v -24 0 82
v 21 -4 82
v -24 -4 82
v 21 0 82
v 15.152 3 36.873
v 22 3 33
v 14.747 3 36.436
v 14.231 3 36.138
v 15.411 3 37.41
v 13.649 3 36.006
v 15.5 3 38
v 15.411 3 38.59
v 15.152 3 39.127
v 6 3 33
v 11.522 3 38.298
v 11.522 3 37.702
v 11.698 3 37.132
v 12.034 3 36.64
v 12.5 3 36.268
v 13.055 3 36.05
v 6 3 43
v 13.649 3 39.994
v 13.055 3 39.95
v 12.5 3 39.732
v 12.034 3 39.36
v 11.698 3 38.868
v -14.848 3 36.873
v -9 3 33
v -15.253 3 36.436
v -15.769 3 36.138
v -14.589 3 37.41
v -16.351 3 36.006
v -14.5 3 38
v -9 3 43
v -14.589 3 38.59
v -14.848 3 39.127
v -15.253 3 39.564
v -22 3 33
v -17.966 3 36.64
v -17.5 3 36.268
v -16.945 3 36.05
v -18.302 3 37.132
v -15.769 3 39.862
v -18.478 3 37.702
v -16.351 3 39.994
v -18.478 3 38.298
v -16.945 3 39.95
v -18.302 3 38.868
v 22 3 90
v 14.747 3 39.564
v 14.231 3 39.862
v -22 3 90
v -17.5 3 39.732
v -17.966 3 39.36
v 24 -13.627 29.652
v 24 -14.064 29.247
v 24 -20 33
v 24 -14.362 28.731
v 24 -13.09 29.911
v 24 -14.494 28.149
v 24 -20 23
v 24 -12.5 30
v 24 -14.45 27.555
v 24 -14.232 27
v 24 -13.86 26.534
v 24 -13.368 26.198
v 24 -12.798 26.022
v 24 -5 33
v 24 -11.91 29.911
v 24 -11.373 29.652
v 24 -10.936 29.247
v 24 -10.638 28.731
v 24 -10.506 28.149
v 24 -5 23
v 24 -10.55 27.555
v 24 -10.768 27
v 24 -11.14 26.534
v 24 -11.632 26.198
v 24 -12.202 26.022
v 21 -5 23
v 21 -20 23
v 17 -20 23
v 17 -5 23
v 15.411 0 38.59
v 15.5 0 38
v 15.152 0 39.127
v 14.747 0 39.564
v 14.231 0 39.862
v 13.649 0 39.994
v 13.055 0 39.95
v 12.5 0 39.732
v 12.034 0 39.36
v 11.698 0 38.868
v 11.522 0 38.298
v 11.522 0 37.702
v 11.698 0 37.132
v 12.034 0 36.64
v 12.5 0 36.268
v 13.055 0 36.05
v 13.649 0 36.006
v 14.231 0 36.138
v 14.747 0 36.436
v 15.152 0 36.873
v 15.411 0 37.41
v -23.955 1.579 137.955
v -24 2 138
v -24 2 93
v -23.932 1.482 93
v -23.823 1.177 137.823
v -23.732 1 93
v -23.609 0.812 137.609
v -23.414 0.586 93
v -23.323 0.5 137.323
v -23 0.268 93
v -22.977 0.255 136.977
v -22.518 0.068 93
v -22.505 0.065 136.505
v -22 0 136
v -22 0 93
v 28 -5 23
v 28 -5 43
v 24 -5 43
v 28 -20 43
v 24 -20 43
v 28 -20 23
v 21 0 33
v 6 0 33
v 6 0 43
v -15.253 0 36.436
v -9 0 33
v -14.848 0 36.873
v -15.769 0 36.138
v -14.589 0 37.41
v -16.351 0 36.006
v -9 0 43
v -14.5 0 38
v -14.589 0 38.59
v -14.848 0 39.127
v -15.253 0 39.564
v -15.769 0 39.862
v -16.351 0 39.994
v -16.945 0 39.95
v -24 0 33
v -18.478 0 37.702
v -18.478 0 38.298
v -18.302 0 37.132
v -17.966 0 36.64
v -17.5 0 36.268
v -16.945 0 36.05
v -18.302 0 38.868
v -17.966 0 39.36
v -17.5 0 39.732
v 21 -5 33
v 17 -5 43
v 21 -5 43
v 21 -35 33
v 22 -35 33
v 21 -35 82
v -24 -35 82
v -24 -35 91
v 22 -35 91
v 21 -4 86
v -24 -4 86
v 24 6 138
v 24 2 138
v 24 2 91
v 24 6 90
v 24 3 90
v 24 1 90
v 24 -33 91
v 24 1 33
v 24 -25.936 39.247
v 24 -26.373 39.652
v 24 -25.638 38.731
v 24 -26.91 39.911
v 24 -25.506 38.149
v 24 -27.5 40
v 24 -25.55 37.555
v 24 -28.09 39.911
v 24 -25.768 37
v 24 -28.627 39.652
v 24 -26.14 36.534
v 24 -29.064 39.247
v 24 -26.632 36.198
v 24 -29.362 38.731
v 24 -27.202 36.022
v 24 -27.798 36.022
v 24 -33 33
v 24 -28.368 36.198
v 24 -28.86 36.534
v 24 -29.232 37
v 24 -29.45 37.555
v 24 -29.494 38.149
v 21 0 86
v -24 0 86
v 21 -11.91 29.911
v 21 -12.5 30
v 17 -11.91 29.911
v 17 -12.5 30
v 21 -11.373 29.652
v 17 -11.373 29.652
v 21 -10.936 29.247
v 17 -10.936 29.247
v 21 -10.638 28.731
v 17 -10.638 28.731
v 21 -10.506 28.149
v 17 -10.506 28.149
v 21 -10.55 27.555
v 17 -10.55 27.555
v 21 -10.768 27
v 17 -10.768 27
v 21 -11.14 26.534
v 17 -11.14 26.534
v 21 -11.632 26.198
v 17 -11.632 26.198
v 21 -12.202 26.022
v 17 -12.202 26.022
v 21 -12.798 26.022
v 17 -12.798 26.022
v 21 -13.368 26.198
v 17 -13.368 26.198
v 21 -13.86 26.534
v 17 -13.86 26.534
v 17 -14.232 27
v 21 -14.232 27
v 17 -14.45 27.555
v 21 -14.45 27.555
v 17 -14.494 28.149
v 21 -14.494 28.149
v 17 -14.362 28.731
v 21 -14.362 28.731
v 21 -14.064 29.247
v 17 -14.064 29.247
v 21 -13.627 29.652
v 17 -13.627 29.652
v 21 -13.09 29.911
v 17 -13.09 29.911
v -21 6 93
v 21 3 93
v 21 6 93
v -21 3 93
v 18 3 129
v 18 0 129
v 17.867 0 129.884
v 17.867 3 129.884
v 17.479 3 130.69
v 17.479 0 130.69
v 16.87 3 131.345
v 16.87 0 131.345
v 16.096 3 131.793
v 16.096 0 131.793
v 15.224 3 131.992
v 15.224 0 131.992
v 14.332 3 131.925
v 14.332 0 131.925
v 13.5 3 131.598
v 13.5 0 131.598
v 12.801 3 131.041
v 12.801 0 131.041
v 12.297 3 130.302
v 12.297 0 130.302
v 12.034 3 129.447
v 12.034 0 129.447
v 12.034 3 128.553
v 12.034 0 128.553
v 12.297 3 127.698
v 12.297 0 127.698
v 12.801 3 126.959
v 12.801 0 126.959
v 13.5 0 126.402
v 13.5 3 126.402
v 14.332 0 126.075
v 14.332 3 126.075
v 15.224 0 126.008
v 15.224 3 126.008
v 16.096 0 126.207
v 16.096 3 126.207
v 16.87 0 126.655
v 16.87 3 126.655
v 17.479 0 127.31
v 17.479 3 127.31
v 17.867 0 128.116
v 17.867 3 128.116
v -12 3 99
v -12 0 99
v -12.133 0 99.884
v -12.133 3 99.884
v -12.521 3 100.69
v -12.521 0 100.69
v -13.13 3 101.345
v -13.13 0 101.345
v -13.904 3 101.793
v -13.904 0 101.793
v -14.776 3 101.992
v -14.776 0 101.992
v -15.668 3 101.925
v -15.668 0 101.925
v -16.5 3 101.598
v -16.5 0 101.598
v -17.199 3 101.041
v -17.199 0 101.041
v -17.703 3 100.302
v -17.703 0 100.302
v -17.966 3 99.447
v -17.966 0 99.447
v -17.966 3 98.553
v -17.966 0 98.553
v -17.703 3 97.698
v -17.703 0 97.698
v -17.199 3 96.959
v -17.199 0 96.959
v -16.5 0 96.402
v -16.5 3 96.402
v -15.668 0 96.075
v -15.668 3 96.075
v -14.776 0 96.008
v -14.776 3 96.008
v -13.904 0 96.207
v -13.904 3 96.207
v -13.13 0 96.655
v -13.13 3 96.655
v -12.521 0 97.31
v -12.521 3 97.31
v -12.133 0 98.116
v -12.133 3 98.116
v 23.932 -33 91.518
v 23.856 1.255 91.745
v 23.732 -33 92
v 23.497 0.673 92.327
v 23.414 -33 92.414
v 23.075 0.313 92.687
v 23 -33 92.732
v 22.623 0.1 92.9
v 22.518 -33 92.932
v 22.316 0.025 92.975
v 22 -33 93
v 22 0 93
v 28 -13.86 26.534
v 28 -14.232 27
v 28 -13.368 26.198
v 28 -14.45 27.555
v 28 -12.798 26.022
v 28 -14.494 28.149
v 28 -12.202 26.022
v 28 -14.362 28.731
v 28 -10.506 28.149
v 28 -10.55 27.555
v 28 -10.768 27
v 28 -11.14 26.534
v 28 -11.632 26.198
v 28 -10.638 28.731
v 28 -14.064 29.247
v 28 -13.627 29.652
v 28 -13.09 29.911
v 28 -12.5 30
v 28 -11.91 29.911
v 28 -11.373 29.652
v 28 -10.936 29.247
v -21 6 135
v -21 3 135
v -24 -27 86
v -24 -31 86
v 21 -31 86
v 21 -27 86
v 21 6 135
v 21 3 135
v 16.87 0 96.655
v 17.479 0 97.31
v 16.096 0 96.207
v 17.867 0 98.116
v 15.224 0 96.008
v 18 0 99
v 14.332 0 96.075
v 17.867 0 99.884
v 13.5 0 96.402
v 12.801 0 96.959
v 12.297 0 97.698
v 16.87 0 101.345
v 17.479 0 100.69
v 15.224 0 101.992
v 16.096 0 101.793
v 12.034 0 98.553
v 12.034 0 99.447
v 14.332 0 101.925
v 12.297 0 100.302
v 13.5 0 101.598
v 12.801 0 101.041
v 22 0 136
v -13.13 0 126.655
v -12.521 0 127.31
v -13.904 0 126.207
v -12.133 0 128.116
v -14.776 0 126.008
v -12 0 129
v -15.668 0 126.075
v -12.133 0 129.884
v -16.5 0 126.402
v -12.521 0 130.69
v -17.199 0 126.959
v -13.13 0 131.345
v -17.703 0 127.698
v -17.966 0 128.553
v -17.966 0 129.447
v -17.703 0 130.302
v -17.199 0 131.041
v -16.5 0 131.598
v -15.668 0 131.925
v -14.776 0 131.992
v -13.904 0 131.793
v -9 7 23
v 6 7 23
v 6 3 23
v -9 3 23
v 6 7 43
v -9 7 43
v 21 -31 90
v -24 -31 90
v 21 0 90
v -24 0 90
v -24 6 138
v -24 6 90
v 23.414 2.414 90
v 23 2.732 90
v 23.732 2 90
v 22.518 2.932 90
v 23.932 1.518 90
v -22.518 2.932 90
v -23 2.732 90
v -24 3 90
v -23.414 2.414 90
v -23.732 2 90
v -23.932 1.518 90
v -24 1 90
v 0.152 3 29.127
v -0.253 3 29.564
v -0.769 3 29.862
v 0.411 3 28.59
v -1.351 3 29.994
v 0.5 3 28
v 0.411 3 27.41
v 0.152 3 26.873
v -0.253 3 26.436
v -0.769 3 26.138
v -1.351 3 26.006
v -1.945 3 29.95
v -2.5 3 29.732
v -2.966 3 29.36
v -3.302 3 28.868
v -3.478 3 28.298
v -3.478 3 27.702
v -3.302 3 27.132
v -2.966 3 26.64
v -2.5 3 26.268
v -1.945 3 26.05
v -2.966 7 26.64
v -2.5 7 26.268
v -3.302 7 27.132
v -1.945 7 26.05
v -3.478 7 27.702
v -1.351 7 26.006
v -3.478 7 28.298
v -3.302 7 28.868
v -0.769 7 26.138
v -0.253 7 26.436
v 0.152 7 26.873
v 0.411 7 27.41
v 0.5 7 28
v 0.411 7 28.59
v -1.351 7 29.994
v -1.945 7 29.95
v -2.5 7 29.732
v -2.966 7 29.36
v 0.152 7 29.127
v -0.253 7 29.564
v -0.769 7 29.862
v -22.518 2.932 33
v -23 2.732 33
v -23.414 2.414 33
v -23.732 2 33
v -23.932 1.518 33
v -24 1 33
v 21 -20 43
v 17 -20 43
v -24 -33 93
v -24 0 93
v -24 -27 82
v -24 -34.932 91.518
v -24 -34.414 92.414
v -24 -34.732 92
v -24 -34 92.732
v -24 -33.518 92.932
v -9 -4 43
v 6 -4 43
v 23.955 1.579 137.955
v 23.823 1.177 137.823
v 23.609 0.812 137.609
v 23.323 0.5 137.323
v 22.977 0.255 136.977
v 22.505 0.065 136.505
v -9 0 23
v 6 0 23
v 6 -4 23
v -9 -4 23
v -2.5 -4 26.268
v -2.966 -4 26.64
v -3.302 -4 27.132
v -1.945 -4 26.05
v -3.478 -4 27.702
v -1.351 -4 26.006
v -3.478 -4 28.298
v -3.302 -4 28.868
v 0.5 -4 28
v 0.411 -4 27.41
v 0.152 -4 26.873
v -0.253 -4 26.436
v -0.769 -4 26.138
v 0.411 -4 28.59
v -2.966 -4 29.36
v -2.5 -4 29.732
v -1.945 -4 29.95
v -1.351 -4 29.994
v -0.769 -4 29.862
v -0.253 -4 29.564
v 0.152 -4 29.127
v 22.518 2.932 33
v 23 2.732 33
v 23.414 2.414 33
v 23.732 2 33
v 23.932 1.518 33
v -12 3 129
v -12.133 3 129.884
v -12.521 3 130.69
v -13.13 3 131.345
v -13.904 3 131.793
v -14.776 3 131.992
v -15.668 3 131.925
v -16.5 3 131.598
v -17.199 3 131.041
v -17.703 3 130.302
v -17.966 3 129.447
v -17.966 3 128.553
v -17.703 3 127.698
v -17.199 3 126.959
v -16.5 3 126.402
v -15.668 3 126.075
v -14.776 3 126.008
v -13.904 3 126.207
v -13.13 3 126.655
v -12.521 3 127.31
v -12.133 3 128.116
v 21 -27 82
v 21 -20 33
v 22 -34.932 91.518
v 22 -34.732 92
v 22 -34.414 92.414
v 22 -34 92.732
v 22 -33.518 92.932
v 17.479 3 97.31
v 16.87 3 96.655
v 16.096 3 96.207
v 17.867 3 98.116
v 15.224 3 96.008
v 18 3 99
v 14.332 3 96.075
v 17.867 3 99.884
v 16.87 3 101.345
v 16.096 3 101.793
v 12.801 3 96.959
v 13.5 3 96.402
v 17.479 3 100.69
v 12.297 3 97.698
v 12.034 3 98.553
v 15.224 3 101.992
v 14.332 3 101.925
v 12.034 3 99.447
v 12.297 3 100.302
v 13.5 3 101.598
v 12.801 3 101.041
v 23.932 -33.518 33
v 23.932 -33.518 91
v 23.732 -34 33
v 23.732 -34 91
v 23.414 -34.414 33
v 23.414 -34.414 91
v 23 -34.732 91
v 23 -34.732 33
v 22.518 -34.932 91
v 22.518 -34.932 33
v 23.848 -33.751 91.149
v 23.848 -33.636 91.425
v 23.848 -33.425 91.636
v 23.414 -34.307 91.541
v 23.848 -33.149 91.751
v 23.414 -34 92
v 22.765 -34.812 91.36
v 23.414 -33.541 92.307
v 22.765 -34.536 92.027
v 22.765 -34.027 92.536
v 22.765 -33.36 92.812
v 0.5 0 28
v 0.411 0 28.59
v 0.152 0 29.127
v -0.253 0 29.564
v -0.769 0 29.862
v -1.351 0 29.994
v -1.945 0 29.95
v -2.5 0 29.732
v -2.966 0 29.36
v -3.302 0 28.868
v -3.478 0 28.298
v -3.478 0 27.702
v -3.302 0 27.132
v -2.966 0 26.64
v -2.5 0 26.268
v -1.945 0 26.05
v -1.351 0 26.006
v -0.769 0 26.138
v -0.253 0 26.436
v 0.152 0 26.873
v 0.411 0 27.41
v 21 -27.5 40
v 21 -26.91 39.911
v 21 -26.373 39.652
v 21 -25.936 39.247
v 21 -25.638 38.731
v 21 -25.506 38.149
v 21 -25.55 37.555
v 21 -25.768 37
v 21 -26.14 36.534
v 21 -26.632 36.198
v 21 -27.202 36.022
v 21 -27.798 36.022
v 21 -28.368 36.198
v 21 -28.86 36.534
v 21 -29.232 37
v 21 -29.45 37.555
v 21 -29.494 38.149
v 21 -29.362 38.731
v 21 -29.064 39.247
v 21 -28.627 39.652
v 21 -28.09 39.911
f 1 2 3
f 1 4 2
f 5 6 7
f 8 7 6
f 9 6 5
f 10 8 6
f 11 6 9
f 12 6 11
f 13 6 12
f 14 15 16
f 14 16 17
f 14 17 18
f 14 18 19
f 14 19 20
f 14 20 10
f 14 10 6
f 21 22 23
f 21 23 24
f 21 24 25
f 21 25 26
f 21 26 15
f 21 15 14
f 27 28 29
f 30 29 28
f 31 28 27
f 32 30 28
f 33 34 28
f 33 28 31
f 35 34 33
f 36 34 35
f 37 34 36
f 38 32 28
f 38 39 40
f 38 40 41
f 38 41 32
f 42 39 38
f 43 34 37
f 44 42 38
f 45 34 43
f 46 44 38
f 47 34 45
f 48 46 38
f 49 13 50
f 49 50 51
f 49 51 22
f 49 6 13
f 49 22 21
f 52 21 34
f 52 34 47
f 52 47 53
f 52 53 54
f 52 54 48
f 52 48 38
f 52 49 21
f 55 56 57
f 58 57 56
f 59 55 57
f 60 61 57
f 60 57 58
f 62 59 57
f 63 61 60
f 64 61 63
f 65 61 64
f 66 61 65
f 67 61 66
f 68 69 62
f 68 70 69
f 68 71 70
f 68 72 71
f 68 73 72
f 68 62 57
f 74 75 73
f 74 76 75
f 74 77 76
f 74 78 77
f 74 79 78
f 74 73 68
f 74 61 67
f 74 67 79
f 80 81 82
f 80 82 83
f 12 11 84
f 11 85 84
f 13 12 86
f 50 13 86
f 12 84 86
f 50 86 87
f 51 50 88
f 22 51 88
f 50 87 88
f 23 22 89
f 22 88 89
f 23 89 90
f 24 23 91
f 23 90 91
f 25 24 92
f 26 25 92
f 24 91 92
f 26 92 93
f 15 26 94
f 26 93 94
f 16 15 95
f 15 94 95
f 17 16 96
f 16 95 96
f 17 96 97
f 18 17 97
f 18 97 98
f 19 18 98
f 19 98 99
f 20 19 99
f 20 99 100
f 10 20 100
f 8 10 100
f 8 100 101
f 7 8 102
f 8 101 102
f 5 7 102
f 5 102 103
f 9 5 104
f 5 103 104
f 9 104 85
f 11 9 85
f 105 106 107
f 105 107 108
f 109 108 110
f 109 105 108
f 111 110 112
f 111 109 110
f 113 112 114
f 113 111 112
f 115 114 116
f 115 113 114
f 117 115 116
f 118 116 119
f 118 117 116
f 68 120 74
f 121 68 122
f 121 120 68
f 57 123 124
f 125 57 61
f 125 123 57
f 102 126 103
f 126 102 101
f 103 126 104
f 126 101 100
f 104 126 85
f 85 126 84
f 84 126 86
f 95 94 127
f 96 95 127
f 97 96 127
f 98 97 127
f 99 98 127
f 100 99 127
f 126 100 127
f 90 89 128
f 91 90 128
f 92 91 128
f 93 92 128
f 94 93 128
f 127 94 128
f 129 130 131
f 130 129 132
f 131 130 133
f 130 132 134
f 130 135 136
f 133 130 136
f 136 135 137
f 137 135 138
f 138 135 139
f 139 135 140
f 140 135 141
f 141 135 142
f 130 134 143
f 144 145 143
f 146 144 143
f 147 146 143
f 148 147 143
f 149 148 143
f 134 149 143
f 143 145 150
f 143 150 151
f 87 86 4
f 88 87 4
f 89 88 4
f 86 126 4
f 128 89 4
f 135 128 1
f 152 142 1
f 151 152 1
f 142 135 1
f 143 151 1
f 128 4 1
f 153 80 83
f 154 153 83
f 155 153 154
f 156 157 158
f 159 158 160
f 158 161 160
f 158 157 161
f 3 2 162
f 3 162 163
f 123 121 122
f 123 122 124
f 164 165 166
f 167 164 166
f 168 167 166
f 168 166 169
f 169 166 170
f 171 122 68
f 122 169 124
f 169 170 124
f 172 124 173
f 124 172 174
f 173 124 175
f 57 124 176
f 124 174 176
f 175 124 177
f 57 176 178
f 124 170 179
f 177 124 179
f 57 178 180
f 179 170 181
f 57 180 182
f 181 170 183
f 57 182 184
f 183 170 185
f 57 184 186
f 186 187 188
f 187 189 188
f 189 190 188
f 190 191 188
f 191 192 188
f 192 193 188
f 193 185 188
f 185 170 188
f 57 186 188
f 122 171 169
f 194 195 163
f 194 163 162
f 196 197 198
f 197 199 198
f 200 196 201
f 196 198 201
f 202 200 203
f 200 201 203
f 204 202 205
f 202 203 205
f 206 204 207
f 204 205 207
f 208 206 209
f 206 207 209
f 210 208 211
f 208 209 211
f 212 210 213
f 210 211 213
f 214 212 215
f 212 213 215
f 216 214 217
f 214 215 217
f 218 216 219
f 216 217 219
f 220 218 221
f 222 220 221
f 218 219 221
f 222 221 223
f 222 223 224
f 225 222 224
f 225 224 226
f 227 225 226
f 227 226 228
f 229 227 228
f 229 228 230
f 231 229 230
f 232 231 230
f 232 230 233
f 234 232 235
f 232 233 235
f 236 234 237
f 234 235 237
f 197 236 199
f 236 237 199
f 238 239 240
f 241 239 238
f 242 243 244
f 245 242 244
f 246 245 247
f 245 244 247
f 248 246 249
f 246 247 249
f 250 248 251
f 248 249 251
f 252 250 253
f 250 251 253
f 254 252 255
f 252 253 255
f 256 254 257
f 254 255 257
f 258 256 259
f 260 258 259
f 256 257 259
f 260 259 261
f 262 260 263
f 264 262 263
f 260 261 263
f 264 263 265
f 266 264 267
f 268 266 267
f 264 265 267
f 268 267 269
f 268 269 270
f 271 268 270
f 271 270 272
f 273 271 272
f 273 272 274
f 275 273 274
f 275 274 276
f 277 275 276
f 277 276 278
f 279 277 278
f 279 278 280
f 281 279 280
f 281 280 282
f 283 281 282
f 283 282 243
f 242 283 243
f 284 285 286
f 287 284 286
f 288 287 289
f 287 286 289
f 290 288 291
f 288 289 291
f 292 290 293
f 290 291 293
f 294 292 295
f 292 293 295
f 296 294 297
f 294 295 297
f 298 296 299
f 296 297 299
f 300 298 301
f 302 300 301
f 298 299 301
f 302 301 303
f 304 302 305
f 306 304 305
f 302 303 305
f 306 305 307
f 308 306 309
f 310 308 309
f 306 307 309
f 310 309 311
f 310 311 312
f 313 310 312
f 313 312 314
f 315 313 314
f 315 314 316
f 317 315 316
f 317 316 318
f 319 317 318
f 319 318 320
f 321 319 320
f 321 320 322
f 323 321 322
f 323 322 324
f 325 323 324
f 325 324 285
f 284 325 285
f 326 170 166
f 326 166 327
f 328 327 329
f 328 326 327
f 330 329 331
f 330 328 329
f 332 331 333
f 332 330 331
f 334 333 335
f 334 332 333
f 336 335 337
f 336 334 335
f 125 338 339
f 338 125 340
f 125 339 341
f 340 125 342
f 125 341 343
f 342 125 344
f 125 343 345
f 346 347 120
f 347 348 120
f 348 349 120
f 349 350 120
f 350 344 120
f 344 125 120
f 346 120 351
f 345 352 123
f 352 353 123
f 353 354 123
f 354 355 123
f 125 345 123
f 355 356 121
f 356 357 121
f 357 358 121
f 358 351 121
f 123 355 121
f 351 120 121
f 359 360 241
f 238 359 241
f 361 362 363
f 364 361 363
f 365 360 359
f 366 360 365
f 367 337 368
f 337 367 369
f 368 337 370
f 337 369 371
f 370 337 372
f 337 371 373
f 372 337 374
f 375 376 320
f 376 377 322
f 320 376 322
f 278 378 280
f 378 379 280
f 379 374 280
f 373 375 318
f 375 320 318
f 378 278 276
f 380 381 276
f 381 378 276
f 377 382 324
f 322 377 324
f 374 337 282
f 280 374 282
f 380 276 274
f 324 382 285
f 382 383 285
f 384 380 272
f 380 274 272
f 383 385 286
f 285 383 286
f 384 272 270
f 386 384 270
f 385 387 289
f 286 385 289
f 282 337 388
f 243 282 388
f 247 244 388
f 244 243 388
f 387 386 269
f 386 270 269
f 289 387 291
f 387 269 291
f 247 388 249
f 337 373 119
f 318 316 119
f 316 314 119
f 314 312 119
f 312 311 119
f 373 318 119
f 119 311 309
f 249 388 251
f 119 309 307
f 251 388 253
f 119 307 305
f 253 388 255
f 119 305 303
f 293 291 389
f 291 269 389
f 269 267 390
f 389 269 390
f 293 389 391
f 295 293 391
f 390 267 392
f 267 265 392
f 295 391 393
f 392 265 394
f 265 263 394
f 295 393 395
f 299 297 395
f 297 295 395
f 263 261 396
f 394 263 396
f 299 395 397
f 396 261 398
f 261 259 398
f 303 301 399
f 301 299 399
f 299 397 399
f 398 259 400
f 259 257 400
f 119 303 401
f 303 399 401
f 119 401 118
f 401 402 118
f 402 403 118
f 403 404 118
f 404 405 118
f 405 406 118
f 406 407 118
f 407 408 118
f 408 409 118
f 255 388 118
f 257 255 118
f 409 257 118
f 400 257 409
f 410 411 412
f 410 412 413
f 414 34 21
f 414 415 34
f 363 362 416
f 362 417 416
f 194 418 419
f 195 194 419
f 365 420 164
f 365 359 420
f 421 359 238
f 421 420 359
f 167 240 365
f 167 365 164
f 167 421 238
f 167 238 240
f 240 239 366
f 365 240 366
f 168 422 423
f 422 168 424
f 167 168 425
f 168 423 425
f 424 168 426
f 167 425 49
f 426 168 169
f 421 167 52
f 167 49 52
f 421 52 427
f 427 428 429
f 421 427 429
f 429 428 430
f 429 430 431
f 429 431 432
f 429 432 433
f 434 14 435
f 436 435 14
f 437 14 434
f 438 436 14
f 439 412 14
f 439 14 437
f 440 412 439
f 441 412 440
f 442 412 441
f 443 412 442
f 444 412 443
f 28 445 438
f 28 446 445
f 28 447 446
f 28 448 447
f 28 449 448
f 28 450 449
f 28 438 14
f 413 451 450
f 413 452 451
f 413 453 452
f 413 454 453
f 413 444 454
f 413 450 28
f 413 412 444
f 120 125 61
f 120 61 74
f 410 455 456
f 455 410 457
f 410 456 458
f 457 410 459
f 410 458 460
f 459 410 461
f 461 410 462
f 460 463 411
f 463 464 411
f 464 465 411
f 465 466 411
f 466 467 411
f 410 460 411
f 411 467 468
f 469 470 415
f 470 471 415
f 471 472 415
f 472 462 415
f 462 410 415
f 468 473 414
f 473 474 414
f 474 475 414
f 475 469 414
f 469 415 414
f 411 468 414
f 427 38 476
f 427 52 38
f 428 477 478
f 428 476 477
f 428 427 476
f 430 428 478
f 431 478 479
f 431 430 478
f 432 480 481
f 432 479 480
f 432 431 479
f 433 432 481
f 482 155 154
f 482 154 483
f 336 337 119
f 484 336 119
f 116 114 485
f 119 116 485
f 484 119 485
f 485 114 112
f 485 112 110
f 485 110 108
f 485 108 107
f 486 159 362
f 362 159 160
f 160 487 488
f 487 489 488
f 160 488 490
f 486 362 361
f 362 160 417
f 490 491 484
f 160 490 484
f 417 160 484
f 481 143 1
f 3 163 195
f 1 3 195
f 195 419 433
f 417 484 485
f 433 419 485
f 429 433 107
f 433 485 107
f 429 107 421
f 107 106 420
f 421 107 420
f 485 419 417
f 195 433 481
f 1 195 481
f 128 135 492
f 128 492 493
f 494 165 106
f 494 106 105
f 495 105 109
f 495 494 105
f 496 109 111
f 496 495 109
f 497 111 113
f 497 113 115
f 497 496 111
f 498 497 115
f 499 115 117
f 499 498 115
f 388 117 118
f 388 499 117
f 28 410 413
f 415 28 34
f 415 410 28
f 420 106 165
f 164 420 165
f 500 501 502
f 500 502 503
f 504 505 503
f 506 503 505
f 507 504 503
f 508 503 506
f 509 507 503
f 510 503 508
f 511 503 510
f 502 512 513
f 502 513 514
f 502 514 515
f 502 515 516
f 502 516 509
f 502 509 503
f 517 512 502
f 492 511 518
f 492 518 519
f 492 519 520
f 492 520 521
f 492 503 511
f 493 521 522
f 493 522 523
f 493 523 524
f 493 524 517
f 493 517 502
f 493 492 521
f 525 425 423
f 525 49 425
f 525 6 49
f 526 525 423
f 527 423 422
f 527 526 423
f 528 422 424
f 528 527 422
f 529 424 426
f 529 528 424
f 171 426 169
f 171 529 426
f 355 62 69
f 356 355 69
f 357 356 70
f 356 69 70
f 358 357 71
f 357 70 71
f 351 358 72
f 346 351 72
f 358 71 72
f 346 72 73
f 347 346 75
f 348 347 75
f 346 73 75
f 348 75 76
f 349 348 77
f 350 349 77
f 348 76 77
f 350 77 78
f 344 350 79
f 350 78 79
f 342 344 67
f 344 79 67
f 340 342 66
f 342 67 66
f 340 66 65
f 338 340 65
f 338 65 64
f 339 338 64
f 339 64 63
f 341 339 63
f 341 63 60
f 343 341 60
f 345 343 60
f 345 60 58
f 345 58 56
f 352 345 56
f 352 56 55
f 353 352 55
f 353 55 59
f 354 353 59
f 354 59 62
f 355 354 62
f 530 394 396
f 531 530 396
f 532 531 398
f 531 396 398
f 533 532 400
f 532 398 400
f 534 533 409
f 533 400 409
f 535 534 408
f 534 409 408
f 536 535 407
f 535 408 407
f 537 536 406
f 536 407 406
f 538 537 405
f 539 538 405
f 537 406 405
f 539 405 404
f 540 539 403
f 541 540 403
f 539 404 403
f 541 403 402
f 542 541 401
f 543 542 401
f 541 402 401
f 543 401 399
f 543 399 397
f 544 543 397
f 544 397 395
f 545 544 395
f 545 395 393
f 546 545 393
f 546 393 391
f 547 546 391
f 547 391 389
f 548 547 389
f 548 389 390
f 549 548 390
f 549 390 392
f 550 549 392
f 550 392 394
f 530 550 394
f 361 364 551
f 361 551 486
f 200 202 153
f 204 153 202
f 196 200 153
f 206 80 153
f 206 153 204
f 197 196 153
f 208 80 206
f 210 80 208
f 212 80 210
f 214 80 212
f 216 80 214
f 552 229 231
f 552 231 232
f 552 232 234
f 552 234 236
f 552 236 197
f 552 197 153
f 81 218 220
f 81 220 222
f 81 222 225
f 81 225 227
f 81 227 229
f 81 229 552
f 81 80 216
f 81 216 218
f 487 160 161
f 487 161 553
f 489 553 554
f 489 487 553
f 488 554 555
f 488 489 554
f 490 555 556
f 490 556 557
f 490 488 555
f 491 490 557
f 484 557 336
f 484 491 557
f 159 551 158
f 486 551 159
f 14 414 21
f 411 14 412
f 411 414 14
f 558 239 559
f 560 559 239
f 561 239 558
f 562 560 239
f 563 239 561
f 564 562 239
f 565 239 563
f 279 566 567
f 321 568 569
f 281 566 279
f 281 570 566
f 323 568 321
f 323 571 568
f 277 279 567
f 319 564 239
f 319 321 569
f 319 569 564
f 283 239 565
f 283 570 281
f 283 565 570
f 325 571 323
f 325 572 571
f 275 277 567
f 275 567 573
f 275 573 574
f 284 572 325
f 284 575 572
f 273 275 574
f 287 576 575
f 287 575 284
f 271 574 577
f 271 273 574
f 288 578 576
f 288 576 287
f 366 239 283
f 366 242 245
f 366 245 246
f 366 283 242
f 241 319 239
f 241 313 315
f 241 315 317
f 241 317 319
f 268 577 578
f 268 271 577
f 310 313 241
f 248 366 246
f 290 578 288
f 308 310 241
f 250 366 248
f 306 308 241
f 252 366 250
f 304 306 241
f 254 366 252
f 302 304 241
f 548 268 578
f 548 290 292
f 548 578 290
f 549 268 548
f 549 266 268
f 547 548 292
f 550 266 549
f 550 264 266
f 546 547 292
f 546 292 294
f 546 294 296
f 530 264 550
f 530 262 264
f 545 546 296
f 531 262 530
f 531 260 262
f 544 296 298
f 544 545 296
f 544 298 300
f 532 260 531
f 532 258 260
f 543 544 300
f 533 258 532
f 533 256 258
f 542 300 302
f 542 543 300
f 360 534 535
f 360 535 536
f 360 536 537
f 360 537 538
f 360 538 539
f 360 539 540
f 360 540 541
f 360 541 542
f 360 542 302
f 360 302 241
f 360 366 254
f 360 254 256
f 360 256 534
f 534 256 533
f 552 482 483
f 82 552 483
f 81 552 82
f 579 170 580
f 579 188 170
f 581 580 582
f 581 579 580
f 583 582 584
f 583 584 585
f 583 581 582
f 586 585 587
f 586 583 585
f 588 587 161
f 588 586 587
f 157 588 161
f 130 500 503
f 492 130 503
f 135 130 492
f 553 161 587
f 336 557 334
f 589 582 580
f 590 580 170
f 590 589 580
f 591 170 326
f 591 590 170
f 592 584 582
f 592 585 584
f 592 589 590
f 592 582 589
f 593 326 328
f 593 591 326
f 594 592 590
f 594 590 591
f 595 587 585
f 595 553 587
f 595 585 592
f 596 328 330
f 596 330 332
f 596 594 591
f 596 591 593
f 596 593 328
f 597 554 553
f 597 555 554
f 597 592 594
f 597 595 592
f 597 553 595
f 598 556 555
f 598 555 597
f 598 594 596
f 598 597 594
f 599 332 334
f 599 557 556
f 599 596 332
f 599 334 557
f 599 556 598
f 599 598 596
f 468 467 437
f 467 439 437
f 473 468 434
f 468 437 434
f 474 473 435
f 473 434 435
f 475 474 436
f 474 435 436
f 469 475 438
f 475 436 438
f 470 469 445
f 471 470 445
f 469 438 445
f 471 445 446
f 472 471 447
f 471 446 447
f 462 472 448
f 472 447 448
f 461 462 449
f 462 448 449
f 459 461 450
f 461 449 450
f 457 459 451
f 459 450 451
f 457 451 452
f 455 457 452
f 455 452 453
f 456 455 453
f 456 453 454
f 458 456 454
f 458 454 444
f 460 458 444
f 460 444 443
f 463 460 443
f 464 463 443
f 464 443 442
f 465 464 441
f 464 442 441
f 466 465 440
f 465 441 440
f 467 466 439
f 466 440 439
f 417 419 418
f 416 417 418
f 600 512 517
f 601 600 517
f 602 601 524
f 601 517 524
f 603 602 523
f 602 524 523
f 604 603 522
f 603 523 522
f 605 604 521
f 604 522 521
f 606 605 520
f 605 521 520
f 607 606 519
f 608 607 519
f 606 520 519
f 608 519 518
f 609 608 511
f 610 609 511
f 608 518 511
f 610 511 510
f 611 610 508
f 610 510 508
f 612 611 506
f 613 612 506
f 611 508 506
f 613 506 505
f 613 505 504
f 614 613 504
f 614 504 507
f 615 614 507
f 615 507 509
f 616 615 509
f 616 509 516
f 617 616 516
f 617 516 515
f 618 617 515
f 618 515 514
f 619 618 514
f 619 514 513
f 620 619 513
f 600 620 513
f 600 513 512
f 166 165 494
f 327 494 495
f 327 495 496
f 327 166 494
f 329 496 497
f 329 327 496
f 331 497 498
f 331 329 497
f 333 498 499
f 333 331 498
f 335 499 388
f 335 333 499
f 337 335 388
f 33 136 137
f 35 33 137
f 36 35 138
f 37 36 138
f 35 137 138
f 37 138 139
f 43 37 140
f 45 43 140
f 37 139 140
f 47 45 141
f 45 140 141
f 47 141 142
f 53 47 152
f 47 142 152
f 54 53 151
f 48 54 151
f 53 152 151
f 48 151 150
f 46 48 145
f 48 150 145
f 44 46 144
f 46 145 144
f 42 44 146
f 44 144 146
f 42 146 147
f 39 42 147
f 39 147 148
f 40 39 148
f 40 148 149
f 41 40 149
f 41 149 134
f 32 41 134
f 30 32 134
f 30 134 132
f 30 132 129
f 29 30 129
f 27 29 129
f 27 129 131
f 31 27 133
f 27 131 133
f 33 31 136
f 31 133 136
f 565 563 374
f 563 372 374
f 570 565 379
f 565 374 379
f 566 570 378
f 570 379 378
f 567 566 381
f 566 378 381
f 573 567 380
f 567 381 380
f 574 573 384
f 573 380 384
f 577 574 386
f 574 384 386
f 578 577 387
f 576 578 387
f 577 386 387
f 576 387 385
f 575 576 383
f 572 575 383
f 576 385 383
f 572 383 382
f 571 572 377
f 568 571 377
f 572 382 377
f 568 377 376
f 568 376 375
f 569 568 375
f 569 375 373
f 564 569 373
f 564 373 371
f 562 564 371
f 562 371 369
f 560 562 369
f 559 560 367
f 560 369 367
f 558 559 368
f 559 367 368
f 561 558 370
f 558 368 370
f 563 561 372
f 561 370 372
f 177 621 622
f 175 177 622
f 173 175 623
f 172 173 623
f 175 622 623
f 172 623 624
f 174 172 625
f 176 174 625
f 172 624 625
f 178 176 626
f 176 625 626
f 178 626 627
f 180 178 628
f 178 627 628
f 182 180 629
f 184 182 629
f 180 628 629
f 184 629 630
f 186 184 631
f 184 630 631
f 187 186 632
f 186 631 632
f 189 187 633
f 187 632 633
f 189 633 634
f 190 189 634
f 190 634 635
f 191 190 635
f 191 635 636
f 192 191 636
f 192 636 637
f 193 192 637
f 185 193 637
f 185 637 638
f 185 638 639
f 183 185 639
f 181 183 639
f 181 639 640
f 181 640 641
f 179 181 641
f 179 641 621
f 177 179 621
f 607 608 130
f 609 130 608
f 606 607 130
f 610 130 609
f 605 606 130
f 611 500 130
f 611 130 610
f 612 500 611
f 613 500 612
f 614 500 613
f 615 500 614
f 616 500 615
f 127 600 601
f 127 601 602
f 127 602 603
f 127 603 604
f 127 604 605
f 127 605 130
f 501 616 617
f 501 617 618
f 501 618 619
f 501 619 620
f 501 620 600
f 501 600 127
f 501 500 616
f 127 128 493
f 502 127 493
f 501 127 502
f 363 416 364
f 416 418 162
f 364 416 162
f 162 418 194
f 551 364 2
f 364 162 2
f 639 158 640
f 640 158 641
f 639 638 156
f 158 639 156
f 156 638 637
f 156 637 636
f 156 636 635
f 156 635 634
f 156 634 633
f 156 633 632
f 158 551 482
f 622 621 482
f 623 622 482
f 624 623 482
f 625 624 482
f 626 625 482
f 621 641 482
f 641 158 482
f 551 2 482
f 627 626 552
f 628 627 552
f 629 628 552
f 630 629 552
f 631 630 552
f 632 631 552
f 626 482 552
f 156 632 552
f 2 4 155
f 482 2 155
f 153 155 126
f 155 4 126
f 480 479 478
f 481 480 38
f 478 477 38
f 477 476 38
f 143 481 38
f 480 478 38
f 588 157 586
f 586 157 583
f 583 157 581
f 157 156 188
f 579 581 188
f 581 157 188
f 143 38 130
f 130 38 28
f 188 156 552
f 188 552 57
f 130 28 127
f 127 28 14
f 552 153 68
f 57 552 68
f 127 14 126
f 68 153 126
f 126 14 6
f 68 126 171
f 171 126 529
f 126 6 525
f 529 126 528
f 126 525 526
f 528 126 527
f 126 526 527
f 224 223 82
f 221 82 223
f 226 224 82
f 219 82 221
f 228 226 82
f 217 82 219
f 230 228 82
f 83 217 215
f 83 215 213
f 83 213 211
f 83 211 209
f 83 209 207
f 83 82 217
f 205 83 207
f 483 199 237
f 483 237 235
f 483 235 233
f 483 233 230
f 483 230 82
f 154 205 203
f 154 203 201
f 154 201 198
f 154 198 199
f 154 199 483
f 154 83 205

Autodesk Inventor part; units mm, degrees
ref_plane "YZ Plane" through (0, 0, 0) normal (1, 0, 0) x (0, 1, 0)
ref_plane "XZ Plane" through (0, 0, 0) normal (0, 1, 0) x (-1, 0, 0)
ref_plane "XY Plane" through (0, 0, 0) normal (0, 0, 1) x (1, 0, 0)
sketch "Sketch1" plane through (0, 0, 0) normal (0, 1, 0) x (-1, 0, 0)
  line L0 (24, 138) -> (-24, 138)
  line L1 (-24, 138) -> (-24, -138)
  line L2 (-24, -138) -> (24, -138)
  line L3 (24, -138) -> (24, 138)
  point P0 (0, 0)
  dimension "d0" = 48
  dimension "d1" = 276
extrude "Extrusion1" add sketch "Sketch1" along normal blind 3
sketch "Sketch2" plane through (0, 3, 0) normal (0, 1, 0) x (1, 0, 0)
  line L0 (-24, 138) -> (-24, -138) projected
  line L1 (-24, -138) -> (-21, -138)
  line L2 (-21, -138) -> (-21, -90)
  line L3 (-21, -90) -> (-24, -90)
  line L4 (-24, -90) -> (-24, -138)
  line L5 (24, -138) -> (24, 138) projected
  line L6 (-21, -90) -> (24, -90)
  line L7 (24, -90) -> (24, -93)
  line L8 (24, -93) -> (-21, -93)
  line L9 (-21, -93) -> (-21, -90)
  line L10 (-24, -138) -> (24, -138) projected
  line L11 (24, -93) -> (21, -93)
  line L12 (21, -93) -> (21, -138)
  line L13 (21, -138) -> (24, -138)
  line L14 (24, -138) -> (24, -93)
  line L15 (21, -138) -> (-21, -138)
  line L16 (-21, -138) -> (-21, -135)
  line L17 (-21, -135) -> (21, -135)
  line L18 (21, -135) -> (21, -138)
  point P0 (0, 0)
  dimension "d4" = 3
  dimension "d5" = 48
  dimension "d6" = 3
  dimension "d7" = 3
  dimension "d8" = 3
extrude "Extrusion2" add sketch "Sketch2" along normal blind 3 contours L3 L2 L1 L0 | L6 L5 L8 L2 | L2 L17 L12 L10 | L12 L8 L5 L10
mirror "Mirror1" about plane through (0, 0, 0) normal (0, 0, 1) of "Extrusion2"
sketch "Sketch3" plane through (0, 0, 0) normal (0, -1, 0) x (1, 0, 0)
  line L0 (24, -90) -> (-24, -90) projected
  line L1 (24, 138) -> (24, -138) projected
  line L2 (-24, -90) -> (24, -90)
  line L3 (24, -90) -> (24, -93)
  line L4 (24, -93) -> (-24, -93)
  line L5 (-24, -93) -> (-24, -90)
  line L6 (-24, 90) -> (24, 90) projected
  line L7 (24, 90) -> (21, 90)
  line L8 (21, 90) -> (21, -90)
  line L9 (21, -90) -> (24, -90)
  line L10 (24, -90) -> (24, 90)
  line L11 (-24, 90) -> (24, 90)
  line L12 (24, 90) -> (24, 93)
  line L13 (24, 93) -> (-24, 93)
  line L14 (-24, 93) -> (-24, 90)
  point P0 (0, 0)
  dimension "d11" = 3
  dimension "d12" = 3
  dimension "d13" = 3
extrude "Extrusion3" add sketch "Sketch3" along normal blind 35
sketch "Sketch4" plane through (-24, 0, -90) normal (0, 0, 1) x (1, 0, 0)
  line L0 (0, -35) -> (45, -35) projected
  line L1 (45, 0) -> (45, -35) projected
  line L2 (0, -35) -> (45, -35)
  line L3 (45, -35) -> (45, -31)
  line L4 (45, -31) -> (0, -31)
  line L5 (0, -31) -> (0, -35)
  point P0 (24, 0)
  dimension "d16" = 4
extrude "Extrusion4" add sketch "Sketch4" along normal blind 8
sketch "Sketch5" plane through (-24, -31, -90) normal (0, 1, 0) x (1, 0, 0)
  line L0 (0, -8) -> (45, -8) projected
  line L1 (45, 0) -> (45, -8) projected
  line L2 (0, -8) -> (45, -8)
  line L3 (45, -8) -> (45, -4)
  line L4 (45, -4) -> (0, -4)
  line L5 (0, -4) -> (0, -8)
  point P0 (24, -90)
  dimension "d19" = 4
extrude "Extrusion5" add sketch "Sketch5" along normal blind 4
sketch "Sketch6" plane through (0, 0, 0) normal (0, -1, 0) x (1, 0, 0)
  line L0 (21, -86) -> (-24, -86) projected
  line L1 (-24, -82) -> (21, -82)
  line L2 (21, -82) -> (21, -86)
  line L3 (21, -86) -> (-24, -86)
  line L4 (-24, -86) -> (-24, -82)
  point P0 (0, 0)
  dimension "d22" = 4
extrude "Extrusion6" add sketch "Sketch6" along normal blind 4
mirror "Mirror2" about plane through (0, 0, 0) normal (0, 0, 1) of "Extrusion6", "Extrusion5", "Extrusion4"
sketch "Sketch7" plane through (0, 0, 0) normal (0, -1, 0) x (1, 0, 0)
  circle A0 centre (-15, -129) radius 3
  circle A1 centre (15, -129) radius 3
  circle A2 centre (15, -99) radius 3
  circle A3 centre (-15, -99) radius 3
  point P0 (0, 0)
  dimension "d25" = 6
  dimension "d26" = 6
  dimension "d27" = 6
  dimension "d28" = 6
extrude "Extrusion7" cut sketch "Sketch7" against normal blind 4
mirror "Mirror3" about plane through (0, 0, 0) normal (0, 0, 1) of "Extrusion7"
sketch "Sketch8" plane through (0, 0, 0) normal (0, -1, 0) x (1, 0, 0)
  line L0 (21, 82) -> (21, -82) projected
  line L1 (-24, -82) -> (-24, 82) projected
  line L2 (21, -20) -> (-24, -20)
  line L3 (-24, -20) -> (-24, -17)
  line L4 (-24, -17) -> (21, -17)
  line L5 (21, -17) -> (21, -20)
  point P0 (0, 0)
  dimension "d31" = 3
extrude "Extrusion8" add sketch "Sketch8" along normal blind 42.3
sketch "Sketch9" plane through (21, 0, -20) normal (0, 0, -1) x (-1, 0, 0)
  circle A0 centre (39.35, -5.65) radius 4
  circle A1 centre (39.35, -36.65) radius 4
  circle A2 centre (8.35, -5.65) radius 4
  circle A3 centre (8.35, -36.65) radius 4
  point P0 (21, 0)
  dimension "d34" = 8
  dimension "d35" = 8
  dimension "d36" = 8
  dimension "d37" = 8
extrude "Extrusion9" add sketch "Sketch9" along normal blind 3
sketch "Sketch10" plane through (-18.35, -36.65, -23) normal (0, 0, -1) x (-1, 0, 0)
  circle A0 centre (0, 0) radius 3
  circle A1 centre (0, 31) radius 4 projected
  circle A2 centre (0, 31) radius 3
  circle A3 centre (-31, 0) radius 4 projected
  circle A4 centre (-31, 0) radius 3
  circle A5 centre (-31, 31) radius 4 projected
  circle A6 centre (-31, 31) radius 3
  point P0 (-18.35, 36.65)
  dimension "d40" = 6
  dimension "d41" = 6
  dimension "d42" = 6
  dimension "d43" = 6
extrude "Extrusion10" cut sketch "Sketch10" against normal blind 2 contours A0 | A2 | A4 | A6
sketch "Sketch11" plane through (21, 0, -20) normal (0, 0, -1) x (-1, 0, 0)
  circle A0 centre (23.85, -21.15) radius 12.5
  circle A1 centre (39.35, -36.65) radius 3 projected
  circle A2 centre (39.35, -36.65) radius 2
  circle A3 centre (8.35, -36.65) radius 3 projected
  circle A4 centre (8.35, -36.65) radius 2
  circle A5 centre (8.35, -5.65) radius 4 projected
  circle A6 centre (8.35, -5.65) radius 2
  circle A7 centre (39.35, -5.65) radius 4 projected
  circle A8 centre (39.35, -5.65) radius 2
  point P0 (21, 0)
  dimension "d46" = 25
  dimension "d47" = 4
  dimension "d48" = 4
  dimension "d49" = 4
  dimension "d50" = 4
extrude "Extrusion11" cut sketch "Sketch11" along normal mid plane 10 contours A0 | A2 | A4 | A6 | A8
sketch "Sketch12" plane through (0, 0, 0) normal (0, -1, 0) x (1, 0, 0)
  line L0 (-24, -17) -> (-24, 82) projected
  line L1 (-24, 33) -> (24, 33)
  line L2 (24, 33) -> (24, -138)
  line L3 (24, -138) -> (-24, -138)
  line L4 (-24, -138) -> (-24, 33)
  point P0 (0, 0)
extrude "Extrusion12" cut sketch "Sketch12" along normal mid plane 100
sketch "Sketch13" plane through (0, 0, 0) normal (0, -1, 0) x (1, 0, 0)
  line L0 (-9, 43) -> (6, 43)
  line L1 (6, 43) -> (6, 23)
  line L2 (6, 23) -> (-9, 23)
  line L3 (-9, 23) -> (-9, 43)
  point P0 (0, 0)
  dimension "d55" = 15
  dimension "d56" = 20
extrude "Extrusion13" add sketch "Sketch13" along normal blind 4 and the other way blind 7
sketch "Sketch14" plane through (21, 0, 86) normal (-1, 0, 0) x (0, 0, 1)
  line L0 (-43, -20) -> (-63, -20)
  line L1 (-63, -20) -> (-63, -5)
  line L2 (-63, -5) -> (-43, -5)
  line L3 (-43, -5) -> (-43, -20)
  point P0 (-86, 0)
  dimension "d61" = 20
  dimension "d62" = 15
extrude "Extrusion14" add sketch "Sketch14" along normal blind 4 and the other way blind 7
sketch "Sketch15" plane through (21, 0, 86) normal (-1, 0, 0) x (0, 0, 1)
  circle A0 centre (-58, -12.5) radius 2
  circle A1 centre (-48, -27.5) radius 2
  point P0 (-86, 0)
  dimension "d67" = 4
  dimension "d68" = 4
extrude "Extrusion15" cut sketch "Sketch15" along normal mid plane 20
sketch "Sketch16" plane through (0, 0, 0) normal (0, -1, 0) x (1, 0, 0)
  circle A0 centre (-16.5, 38) radius 2
  circle A1 centre (-1.5, 28) radius 2
  circle A2 centre (13.5, 38) radius 2
  point P0 (0, 0)
  dimension "d71" = 4
  dimension "d72" = 4
  dimension "d73" = 4
extrude "Extrusion16" cut sketch "Sketch16" along normal mid plane 20
sketch "Sketch17" plane through (6, -4, 23) normal (0, 0, -1) x (-1, 0, 0)
  line L0 (-18, 7) -> (0, 7) projected
  line L1 (15, 4) -> (15, 0) projected
  line L2 (0, 7) -> (15, 7)
  line L3 (15, 7) -> (15, 4)
  line L4 (15, 4) -> (0, 4)
  line L5 (0, 4) -> (0, 7)
  line L6 (-15, -16) -> (-18, -16)
  line L7 (-18, -16) -> (-18, -1)
  line L8 (-18, -1) -> (-15, -1)
  line L9 (-15, -1) -> (-15, -16)
  point P0 (6, 4)
  dimension "d76" = 3
extrude "Extrusion17" cut sketch "Sketch17" against normal blind 10
fillet "Fillet1" radius 2 8 edges at (-24, 0, 115.5) (0, 0, 138) (24, 0, 115.5) (0, -35, 93) (-24, 3, 61.5) (24, -35, 63) (24, 3, 61.5) (24, -17.5, 93)
properties part number "carriageEndR"
